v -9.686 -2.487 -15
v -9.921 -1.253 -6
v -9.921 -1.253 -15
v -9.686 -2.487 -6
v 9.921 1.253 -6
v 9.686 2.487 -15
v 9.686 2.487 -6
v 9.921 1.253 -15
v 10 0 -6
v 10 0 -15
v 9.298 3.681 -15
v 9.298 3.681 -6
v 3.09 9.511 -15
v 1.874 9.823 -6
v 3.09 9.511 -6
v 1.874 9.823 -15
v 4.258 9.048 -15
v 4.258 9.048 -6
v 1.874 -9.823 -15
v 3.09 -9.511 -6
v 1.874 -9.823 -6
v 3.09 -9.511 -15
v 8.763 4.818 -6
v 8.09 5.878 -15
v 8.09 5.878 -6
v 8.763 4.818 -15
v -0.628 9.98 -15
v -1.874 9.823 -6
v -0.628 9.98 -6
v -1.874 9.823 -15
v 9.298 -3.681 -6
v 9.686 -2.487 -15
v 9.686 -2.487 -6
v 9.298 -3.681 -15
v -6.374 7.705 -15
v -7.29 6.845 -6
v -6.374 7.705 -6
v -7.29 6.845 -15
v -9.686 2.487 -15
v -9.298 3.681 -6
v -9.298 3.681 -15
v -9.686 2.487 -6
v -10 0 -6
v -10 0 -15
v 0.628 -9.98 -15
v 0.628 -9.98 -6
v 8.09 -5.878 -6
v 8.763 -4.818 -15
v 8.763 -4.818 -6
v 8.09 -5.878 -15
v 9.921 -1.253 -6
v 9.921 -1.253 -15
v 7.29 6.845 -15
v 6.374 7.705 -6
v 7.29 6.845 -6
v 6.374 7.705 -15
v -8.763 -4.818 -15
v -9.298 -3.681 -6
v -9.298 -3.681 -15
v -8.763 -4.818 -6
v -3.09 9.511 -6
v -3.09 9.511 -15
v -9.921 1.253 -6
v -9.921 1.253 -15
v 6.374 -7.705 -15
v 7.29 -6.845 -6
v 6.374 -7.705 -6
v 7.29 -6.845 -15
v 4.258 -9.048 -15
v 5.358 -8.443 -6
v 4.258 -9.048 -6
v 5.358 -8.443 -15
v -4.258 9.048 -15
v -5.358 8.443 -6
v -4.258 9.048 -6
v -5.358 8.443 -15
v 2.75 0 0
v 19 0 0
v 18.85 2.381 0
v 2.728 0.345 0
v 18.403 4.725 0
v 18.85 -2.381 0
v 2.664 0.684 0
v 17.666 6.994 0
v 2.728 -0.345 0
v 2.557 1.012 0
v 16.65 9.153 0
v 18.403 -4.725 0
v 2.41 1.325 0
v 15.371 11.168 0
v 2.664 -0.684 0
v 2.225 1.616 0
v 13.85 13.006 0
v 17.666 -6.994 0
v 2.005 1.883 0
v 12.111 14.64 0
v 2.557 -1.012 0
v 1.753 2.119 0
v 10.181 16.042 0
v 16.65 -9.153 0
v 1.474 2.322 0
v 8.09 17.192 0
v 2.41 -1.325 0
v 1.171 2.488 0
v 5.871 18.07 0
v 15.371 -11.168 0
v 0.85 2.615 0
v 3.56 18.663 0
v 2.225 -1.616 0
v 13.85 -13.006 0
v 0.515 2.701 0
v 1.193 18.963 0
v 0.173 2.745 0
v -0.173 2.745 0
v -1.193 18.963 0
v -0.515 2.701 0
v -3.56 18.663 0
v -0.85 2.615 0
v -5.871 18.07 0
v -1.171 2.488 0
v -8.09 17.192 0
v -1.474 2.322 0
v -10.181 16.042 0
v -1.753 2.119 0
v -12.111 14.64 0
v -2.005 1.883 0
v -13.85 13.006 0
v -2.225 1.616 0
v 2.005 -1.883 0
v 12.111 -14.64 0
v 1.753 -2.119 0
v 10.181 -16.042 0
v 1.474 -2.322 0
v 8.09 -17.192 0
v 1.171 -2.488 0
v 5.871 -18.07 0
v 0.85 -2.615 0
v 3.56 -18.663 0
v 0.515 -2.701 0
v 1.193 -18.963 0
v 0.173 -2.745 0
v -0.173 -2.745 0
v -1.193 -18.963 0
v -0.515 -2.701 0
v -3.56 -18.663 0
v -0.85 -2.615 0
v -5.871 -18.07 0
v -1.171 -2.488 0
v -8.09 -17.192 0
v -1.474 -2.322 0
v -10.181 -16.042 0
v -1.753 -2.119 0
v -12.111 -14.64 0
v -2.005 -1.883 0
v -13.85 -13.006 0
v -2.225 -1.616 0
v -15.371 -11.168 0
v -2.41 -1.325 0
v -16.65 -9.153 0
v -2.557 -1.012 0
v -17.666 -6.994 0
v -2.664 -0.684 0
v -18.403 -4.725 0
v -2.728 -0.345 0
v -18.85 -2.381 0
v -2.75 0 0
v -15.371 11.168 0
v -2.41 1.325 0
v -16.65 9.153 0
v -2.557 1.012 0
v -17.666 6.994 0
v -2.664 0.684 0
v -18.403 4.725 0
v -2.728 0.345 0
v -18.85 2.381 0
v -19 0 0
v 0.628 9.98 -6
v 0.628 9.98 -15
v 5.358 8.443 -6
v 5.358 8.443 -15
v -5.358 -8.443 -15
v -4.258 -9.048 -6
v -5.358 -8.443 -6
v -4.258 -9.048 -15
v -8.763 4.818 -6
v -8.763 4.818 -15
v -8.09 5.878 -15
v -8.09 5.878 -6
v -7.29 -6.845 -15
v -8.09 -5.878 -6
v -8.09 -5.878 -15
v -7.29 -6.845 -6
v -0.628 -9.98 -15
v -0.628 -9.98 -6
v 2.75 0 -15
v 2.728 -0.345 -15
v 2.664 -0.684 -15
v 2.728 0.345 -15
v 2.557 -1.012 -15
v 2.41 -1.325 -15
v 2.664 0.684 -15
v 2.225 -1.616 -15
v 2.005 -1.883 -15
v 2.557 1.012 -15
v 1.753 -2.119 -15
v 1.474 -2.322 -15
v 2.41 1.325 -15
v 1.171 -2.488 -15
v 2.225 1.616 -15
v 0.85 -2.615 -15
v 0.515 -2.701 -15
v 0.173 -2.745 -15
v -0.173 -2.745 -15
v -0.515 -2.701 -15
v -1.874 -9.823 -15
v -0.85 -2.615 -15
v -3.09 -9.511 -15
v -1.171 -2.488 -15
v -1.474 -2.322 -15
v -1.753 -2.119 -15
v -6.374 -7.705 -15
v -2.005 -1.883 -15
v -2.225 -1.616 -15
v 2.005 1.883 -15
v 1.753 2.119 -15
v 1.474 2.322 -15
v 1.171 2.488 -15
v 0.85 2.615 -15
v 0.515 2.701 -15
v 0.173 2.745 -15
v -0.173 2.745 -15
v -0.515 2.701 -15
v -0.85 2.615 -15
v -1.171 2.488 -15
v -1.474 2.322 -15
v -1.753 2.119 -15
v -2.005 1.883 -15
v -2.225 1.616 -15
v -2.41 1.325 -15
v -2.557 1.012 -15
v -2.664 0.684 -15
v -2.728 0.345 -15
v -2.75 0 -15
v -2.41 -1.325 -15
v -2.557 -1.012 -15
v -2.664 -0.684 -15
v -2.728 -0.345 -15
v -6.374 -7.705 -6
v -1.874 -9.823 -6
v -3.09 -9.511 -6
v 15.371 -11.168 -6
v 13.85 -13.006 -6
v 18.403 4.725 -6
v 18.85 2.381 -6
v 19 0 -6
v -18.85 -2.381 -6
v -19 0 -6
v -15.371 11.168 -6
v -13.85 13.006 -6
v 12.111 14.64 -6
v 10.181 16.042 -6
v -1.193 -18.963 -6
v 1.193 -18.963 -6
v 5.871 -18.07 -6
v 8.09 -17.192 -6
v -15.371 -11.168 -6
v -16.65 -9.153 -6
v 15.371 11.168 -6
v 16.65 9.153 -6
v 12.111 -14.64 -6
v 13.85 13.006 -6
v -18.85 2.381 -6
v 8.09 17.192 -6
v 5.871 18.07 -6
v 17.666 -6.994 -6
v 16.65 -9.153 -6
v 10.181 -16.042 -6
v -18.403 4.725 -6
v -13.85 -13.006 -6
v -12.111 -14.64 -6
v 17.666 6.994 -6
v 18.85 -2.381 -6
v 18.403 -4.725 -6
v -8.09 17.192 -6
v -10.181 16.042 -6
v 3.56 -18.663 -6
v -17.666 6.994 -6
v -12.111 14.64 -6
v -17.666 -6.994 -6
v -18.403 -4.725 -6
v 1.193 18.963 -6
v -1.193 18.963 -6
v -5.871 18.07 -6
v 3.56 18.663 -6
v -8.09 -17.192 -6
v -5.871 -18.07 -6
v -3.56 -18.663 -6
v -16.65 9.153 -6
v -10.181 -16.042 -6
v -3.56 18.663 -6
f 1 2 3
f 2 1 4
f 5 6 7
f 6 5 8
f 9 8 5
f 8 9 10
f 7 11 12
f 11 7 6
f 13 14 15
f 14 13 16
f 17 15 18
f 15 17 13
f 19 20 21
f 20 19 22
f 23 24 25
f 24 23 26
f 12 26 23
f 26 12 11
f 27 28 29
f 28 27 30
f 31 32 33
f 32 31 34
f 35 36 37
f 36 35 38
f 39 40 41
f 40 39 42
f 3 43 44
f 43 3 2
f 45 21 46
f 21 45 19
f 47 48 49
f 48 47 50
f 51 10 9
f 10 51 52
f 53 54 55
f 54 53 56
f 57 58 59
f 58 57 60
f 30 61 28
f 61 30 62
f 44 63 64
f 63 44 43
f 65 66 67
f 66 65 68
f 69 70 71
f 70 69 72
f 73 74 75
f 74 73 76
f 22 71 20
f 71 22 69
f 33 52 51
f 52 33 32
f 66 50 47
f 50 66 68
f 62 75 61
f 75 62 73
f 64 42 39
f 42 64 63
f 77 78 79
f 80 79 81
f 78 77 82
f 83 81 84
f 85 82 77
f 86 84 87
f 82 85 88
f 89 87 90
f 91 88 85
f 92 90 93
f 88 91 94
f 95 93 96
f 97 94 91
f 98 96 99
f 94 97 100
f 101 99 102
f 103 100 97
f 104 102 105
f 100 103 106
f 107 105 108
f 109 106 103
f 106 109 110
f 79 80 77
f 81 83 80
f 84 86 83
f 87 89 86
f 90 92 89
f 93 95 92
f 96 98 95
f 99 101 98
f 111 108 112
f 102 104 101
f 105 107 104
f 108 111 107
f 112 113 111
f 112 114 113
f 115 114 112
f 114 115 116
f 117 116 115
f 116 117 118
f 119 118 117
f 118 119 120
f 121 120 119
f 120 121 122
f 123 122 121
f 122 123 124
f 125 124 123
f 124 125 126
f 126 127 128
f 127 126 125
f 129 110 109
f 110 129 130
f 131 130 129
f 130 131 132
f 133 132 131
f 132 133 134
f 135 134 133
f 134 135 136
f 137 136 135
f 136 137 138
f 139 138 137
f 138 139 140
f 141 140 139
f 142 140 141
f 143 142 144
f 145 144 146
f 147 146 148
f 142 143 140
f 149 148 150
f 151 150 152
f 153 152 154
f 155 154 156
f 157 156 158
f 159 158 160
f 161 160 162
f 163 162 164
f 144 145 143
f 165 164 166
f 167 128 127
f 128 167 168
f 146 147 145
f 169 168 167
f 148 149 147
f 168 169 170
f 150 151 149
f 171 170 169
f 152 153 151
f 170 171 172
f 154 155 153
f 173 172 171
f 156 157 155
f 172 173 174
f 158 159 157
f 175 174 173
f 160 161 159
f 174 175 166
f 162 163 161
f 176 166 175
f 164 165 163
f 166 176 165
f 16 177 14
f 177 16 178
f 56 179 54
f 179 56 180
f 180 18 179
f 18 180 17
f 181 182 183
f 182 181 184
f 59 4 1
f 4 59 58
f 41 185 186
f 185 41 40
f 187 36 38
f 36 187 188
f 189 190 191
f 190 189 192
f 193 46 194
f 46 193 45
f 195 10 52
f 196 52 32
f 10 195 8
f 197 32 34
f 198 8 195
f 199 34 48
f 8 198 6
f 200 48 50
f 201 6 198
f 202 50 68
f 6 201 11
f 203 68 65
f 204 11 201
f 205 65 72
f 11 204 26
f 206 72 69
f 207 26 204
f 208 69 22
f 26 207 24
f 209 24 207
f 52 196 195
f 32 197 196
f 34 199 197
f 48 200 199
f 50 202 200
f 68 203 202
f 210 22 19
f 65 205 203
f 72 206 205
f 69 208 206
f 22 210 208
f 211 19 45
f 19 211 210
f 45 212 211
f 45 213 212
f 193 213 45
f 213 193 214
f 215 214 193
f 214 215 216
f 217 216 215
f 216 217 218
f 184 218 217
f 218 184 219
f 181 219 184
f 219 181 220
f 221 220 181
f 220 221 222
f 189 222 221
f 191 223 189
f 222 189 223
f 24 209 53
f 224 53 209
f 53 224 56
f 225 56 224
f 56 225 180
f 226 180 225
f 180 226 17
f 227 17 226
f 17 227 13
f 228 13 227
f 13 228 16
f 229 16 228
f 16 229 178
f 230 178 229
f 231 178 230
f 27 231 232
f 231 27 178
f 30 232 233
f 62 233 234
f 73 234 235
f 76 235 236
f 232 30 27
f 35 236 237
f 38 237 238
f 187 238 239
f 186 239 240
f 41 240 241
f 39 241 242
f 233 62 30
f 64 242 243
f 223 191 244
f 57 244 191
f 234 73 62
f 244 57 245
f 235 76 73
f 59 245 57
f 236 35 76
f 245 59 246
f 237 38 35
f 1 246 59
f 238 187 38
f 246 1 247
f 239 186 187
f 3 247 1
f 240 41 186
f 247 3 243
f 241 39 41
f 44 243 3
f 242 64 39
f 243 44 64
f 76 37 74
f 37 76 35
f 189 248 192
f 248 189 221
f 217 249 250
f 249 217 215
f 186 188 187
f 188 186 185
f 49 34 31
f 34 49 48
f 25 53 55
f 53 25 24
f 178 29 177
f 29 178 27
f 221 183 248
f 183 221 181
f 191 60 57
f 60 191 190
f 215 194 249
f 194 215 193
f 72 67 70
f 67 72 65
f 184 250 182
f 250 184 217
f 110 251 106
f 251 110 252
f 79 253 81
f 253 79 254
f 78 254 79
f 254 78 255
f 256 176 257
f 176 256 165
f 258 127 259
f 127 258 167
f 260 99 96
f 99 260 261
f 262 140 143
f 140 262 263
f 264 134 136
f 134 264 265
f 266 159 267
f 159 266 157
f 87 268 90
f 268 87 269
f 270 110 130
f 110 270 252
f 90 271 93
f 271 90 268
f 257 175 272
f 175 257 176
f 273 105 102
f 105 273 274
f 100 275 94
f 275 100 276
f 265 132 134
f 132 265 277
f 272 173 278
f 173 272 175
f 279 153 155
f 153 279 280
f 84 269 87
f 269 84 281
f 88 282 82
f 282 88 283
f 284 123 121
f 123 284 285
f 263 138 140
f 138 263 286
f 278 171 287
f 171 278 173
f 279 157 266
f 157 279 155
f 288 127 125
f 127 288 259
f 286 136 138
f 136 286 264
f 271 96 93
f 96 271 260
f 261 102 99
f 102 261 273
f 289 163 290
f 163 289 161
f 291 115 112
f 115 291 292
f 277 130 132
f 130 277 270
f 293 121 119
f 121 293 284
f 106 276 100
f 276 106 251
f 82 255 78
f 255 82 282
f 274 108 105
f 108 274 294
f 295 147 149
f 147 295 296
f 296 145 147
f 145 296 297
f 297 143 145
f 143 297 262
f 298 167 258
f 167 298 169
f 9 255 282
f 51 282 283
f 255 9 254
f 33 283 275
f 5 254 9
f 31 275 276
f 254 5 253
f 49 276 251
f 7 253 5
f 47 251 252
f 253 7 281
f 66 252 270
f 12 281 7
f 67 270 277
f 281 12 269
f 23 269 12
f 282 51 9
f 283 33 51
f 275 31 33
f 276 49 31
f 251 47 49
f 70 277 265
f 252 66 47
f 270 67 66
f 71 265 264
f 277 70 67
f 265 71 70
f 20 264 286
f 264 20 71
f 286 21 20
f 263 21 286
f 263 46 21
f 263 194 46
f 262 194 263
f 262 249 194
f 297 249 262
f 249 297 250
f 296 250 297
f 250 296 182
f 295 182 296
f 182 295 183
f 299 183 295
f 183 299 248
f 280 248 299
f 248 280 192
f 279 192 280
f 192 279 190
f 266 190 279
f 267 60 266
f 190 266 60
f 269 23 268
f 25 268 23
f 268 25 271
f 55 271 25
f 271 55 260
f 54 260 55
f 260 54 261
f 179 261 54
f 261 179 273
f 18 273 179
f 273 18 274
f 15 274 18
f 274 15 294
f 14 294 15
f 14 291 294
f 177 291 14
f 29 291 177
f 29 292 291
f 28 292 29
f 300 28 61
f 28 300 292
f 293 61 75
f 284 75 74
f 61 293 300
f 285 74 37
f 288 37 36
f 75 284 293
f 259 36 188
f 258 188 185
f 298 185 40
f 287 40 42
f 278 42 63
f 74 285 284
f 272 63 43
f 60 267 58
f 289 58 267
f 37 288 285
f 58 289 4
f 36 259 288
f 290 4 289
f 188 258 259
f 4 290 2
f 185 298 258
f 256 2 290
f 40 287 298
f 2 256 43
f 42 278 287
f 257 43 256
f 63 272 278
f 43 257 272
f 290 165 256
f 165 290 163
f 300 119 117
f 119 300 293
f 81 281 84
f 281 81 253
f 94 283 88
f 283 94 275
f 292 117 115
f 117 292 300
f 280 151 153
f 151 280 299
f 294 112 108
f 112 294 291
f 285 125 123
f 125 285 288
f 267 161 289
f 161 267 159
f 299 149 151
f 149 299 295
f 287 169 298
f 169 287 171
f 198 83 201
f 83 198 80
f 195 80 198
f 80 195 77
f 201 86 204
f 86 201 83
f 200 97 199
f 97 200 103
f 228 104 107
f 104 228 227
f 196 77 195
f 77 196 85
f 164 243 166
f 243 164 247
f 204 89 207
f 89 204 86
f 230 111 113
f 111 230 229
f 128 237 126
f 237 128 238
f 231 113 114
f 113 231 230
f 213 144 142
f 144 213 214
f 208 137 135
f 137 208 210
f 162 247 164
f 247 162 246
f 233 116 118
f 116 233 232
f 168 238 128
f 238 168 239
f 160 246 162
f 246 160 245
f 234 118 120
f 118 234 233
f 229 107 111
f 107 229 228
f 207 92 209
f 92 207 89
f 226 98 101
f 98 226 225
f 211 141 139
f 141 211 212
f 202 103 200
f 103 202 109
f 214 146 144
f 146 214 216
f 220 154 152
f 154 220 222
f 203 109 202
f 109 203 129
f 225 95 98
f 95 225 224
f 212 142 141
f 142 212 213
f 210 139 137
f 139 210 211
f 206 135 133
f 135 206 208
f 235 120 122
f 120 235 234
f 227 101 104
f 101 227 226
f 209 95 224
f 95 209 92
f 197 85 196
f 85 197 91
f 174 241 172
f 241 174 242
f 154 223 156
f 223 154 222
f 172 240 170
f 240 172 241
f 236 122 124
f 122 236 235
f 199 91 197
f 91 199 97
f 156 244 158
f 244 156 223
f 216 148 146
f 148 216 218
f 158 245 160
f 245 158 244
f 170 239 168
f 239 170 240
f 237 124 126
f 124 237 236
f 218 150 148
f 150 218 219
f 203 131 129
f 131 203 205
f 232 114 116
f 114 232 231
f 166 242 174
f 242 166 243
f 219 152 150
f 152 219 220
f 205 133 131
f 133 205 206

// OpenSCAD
$fn = 50;


difference() {
	union() {
		translate(v = [0, 0, -15.0000000000]) {
			cylinder(h = 15, r = 10.0000000000);
		}
		translate(v = [0, 0, -6.0000000000]) {
			cylinder(h = 6, r = 19.0000000000);
		}
	}
	union() {
		#translate(v = [0, 0, -15]) {
			cylinder(h = 15, r = 2.7500000000);
		}
	}
}
